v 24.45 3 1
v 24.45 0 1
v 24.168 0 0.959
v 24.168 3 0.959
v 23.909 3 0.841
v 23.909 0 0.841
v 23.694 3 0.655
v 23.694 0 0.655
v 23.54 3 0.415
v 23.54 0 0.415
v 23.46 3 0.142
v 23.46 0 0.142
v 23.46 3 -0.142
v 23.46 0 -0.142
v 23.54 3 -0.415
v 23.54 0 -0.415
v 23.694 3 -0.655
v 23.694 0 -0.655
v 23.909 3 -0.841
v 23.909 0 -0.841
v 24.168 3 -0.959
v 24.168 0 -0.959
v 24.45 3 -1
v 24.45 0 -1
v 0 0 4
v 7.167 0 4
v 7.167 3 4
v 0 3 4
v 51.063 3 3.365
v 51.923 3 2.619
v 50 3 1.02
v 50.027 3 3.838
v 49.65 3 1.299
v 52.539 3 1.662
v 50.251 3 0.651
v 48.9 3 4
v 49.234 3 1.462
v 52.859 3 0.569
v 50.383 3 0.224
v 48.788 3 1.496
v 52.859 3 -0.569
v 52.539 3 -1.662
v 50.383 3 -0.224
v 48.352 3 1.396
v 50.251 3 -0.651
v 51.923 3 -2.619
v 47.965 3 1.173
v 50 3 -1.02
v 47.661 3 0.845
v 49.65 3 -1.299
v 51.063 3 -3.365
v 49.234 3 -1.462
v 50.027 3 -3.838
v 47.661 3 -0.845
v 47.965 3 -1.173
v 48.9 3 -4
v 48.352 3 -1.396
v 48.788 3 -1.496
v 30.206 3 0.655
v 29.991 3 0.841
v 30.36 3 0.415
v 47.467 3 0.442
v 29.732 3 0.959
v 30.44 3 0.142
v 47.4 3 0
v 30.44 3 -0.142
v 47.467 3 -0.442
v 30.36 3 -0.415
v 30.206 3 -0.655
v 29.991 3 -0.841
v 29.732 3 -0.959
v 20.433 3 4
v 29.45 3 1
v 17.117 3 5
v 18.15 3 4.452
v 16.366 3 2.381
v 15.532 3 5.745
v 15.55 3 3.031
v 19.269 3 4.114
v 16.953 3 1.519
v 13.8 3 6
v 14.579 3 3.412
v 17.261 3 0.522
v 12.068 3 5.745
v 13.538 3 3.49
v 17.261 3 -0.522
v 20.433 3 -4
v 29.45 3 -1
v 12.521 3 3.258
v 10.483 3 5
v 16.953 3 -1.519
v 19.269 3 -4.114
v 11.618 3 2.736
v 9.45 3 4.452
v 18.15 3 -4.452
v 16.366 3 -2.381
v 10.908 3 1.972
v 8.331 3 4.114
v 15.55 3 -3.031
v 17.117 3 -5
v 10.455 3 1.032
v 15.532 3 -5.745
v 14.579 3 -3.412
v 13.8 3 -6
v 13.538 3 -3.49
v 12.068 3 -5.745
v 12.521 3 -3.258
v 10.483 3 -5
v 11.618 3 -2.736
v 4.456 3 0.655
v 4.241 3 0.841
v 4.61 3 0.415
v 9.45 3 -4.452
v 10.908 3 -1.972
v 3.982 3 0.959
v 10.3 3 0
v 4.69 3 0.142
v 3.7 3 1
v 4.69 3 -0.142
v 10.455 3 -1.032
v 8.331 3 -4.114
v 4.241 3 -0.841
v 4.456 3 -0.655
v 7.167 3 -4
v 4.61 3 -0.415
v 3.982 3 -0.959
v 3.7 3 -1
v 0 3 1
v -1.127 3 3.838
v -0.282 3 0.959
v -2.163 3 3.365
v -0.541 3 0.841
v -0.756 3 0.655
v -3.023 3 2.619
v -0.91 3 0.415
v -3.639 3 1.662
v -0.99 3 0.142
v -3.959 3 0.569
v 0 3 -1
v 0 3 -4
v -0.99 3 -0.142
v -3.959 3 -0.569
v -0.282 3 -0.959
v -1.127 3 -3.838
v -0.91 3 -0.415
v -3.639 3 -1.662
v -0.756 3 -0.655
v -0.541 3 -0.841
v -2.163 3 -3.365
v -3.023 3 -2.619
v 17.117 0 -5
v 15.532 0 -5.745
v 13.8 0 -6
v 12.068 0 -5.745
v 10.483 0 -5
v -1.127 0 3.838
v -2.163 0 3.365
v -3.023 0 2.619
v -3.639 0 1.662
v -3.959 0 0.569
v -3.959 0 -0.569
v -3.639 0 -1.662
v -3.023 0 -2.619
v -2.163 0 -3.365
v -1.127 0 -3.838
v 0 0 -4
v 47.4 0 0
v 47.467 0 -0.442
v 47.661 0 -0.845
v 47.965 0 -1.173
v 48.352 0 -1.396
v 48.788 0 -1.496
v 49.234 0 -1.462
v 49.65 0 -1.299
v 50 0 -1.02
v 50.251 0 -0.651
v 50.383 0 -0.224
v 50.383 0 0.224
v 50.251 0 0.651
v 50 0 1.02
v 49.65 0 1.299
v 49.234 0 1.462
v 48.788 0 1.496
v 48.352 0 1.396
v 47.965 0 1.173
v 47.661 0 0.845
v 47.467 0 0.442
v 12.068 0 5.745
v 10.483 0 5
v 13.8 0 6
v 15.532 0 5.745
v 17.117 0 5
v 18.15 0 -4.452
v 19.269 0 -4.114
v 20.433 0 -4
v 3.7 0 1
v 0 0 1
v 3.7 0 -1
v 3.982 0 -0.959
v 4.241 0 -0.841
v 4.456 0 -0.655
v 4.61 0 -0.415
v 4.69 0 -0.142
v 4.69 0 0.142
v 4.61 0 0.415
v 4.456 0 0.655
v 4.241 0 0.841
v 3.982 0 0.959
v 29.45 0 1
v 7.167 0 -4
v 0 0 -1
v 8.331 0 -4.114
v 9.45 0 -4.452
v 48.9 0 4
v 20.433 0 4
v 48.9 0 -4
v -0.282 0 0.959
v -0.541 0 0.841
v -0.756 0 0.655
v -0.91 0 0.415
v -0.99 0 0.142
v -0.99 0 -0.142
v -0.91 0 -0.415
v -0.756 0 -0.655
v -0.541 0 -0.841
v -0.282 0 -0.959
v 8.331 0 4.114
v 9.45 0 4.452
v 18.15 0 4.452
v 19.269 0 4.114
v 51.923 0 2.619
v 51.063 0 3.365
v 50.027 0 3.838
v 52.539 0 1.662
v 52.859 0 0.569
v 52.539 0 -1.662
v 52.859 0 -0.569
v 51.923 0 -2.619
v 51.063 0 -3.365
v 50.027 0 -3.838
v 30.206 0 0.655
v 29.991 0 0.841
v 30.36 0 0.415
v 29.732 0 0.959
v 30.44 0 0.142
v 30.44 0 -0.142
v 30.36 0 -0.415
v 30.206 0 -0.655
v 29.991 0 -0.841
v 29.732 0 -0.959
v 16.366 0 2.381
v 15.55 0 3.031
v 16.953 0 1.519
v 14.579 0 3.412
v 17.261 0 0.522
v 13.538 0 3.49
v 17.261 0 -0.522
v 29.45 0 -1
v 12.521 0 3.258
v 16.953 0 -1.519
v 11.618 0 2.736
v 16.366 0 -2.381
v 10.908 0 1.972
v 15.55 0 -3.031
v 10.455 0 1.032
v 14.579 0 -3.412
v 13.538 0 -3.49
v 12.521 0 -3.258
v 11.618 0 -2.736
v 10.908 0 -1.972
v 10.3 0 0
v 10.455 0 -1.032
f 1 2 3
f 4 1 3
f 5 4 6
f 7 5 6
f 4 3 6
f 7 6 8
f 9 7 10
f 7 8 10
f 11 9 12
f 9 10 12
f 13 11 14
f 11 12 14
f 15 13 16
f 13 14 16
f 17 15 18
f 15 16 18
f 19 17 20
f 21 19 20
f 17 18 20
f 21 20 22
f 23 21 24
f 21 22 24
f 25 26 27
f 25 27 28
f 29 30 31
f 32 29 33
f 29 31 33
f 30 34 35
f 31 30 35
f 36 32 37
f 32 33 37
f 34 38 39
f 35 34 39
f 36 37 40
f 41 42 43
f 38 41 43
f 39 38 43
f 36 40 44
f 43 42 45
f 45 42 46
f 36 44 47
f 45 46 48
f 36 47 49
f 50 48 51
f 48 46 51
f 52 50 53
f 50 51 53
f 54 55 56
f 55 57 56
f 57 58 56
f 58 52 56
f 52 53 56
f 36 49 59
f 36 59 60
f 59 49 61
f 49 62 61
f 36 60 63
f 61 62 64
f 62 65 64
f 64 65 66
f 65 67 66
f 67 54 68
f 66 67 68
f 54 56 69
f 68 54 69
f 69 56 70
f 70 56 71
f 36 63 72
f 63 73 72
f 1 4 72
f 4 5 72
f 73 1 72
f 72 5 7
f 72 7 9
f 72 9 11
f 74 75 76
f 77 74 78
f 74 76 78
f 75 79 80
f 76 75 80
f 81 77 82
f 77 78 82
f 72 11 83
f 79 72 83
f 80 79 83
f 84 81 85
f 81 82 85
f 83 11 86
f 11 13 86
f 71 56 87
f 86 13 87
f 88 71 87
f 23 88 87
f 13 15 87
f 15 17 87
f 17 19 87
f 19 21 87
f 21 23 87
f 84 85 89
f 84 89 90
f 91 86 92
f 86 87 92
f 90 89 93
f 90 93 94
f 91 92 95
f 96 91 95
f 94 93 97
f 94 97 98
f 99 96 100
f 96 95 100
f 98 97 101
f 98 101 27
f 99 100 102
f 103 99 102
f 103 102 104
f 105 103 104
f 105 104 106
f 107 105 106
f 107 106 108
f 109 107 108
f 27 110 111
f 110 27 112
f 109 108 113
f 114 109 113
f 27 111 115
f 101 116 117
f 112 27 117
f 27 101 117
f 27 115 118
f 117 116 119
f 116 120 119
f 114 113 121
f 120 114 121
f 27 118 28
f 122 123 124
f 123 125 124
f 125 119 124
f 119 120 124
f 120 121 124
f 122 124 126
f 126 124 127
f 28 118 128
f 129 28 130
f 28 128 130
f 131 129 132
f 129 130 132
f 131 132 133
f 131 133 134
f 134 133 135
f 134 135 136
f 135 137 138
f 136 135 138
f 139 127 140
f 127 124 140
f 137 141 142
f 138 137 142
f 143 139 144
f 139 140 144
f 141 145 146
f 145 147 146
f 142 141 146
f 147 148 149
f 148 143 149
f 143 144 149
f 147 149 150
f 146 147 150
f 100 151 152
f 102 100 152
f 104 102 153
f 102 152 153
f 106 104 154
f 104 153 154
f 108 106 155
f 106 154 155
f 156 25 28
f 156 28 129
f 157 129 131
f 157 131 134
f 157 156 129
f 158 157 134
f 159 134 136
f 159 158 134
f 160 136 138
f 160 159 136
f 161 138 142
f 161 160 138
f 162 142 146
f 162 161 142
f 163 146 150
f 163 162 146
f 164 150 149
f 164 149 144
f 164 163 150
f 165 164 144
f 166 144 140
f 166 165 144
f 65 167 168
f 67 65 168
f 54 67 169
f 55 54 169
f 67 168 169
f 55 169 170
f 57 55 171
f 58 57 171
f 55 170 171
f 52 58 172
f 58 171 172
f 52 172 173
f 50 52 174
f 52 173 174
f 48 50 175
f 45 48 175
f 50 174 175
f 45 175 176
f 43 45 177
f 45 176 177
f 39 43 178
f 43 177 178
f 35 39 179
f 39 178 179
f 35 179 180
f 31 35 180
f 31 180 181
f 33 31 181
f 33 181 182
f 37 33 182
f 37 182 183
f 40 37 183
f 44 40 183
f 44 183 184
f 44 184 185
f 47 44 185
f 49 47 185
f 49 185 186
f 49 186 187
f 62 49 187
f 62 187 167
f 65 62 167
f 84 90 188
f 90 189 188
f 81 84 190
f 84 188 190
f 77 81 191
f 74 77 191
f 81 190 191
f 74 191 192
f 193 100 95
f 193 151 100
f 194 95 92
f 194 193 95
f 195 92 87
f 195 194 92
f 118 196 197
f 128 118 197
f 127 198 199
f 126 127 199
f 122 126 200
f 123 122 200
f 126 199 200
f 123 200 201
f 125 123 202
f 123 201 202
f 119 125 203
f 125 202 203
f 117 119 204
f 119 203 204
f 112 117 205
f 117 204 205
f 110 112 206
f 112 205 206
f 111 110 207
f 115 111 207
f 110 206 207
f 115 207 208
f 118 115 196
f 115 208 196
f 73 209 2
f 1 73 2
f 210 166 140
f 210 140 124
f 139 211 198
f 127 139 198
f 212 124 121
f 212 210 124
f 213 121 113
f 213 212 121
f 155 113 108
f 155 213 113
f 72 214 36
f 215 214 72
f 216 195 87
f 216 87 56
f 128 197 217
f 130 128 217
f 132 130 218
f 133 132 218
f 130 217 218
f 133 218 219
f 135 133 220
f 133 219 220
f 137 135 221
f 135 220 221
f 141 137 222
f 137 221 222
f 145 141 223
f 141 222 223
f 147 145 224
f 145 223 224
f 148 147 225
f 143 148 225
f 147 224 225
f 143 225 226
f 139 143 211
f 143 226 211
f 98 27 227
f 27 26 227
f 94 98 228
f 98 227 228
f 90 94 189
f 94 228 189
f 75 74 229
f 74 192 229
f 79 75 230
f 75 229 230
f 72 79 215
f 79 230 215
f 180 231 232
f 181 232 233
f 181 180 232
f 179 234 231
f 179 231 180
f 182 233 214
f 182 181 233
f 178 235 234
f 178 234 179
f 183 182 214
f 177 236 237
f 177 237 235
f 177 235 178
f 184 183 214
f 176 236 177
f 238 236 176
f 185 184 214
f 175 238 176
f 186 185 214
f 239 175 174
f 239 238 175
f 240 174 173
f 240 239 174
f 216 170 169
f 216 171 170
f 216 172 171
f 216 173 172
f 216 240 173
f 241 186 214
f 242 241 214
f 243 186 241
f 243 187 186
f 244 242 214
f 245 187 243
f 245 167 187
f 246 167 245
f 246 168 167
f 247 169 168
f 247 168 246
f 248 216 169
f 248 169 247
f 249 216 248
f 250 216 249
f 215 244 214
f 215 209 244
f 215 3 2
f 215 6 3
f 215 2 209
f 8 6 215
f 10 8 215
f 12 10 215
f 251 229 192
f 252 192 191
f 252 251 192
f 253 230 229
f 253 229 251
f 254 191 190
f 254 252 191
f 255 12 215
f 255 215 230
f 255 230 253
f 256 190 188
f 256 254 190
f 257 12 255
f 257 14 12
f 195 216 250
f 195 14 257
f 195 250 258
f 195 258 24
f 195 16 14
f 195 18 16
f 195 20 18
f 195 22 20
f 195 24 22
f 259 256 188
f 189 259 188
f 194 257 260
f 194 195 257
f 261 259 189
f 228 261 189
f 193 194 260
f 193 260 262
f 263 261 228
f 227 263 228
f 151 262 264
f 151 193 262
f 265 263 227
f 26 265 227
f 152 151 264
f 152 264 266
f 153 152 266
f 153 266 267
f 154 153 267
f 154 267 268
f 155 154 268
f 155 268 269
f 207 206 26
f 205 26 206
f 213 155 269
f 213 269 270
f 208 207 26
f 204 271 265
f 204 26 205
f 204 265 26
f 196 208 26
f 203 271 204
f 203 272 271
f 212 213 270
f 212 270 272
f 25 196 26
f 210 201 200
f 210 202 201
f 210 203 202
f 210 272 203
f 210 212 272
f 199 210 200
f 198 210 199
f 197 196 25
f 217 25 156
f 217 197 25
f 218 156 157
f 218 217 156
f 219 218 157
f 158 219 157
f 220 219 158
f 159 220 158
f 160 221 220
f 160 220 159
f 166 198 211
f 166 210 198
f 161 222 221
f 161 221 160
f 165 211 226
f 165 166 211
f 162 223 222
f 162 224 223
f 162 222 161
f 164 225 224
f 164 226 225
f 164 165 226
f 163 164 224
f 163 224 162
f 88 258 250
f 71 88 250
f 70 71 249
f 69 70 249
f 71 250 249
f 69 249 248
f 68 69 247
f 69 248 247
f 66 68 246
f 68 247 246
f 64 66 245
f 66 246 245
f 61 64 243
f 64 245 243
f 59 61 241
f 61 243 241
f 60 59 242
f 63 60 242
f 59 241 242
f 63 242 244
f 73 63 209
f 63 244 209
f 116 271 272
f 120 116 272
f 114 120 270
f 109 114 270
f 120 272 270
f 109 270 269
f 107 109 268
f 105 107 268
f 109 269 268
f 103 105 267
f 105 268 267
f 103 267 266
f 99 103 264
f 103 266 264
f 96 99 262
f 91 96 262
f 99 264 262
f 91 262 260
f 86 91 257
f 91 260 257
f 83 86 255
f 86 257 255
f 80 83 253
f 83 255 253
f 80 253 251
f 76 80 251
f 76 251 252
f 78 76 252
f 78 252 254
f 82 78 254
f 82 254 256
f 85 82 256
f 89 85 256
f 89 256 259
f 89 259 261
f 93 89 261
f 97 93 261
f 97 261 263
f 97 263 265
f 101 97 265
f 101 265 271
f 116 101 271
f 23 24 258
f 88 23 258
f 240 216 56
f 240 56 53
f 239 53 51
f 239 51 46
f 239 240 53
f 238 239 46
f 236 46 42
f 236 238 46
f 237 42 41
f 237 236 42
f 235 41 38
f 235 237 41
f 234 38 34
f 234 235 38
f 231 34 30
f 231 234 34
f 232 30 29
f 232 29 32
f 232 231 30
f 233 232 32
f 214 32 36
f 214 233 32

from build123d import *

# Parameters (mm, degrees)
ESBO_O1_R                  = 6
RESSALTO_EXTRUS_O1_DEPTH   = 3
FURO_DE_DI_METRO_3_0_3_1_D = 3
FURO_DE_DI_METRO_7_0_7_1_D = 7
FILETE1_R                  = 6


with BuildPart() as part:
    # Esboço1 → Ressalto-extrusão1 (new body)
    # profile 1 of 2: a face of its own
    with BuildSketch(Plane(origin=(0, 0, 0), x_dir=(1, 0, 0), z_dir=(0, 1, 0))):
        with Locations((13.8, 0)):
            Circle(ESBO_O1_R)
    # profile 2 of 2: a face of its own
    with BuildSketch(Plane(origin=(0, 0, 0), x_dir=(1, 0, 0), z_dir=(0, 1, 0))):
        with BuildLine():
            Line((0, 4), (48.9, 4))
            ThreePointArc((48.9, 4), (52.9, 0), (48.9, -4))
            Line((48.9, -4), (0, -4))
            ThreePointArc((0, -4), (-4, 0), (0, 4))
        make_face()
        with BuildLine():
            Line((0, 1), (3.7, 1))
            ThreePointArc((3.7, 1), (4.7, 0), (3.7, -1))
            Line((3.7, -1), (0, -1))
            ThreePointArc((0, -1), (-1, 0), (0, 1))
        make_face(mode=Mode.SUBTRACT)
        with BuildLine():
            Line((24.45, 1), (29.45, 1))
            ThreePointArc((29.45, 1), (30.45, 0), (29.45, -1))
            Line((29.45, -1), (24.45, -1))
            ThreePointArc((24.45, -1), (23.45, 0), (24.45, 1))
        make_face(mode=Mode.SUBTRACT)
    extrude(amount=RESSALTO_EXTRUS_O1_DEPTH)

    # Furo de diâmetro Ø3.0 (3)1 (through all)
    with Locations(Plane(origin=(0, 3, 0), x_dir=(1, 0, 0), z_dir=(0, 1, 0))):
        with Locations((48.9, 0)):
            Hole(FURO_DE_DI_METRO_3_0_3_1_D / 2)

    # Furo de diâmetro Ø7.0 (7)1 (through all)
    with Locations(Plane(origin=(0, 3, 0), x_dir=(1, 0, 0), z_dir=(0, 1, 0))):
        with Locations((13.8, 0)):
            Hole(FURO_DE_DI_METRO_7_0_7_1_D / 2)

    # Filete1
    filete1_edges = [part.edges().sort_by_distance(p)[0] for p in [
        (9.327864045, 1.5, -4),
        (18.272135955, 1.5, -4),
        (18.272135955, 1.5, 4),
        (9.327864045, 1.5, 4),
    ]]
    fillet(filete1_edges, radius=FILETE1_R)


solid = part.part
